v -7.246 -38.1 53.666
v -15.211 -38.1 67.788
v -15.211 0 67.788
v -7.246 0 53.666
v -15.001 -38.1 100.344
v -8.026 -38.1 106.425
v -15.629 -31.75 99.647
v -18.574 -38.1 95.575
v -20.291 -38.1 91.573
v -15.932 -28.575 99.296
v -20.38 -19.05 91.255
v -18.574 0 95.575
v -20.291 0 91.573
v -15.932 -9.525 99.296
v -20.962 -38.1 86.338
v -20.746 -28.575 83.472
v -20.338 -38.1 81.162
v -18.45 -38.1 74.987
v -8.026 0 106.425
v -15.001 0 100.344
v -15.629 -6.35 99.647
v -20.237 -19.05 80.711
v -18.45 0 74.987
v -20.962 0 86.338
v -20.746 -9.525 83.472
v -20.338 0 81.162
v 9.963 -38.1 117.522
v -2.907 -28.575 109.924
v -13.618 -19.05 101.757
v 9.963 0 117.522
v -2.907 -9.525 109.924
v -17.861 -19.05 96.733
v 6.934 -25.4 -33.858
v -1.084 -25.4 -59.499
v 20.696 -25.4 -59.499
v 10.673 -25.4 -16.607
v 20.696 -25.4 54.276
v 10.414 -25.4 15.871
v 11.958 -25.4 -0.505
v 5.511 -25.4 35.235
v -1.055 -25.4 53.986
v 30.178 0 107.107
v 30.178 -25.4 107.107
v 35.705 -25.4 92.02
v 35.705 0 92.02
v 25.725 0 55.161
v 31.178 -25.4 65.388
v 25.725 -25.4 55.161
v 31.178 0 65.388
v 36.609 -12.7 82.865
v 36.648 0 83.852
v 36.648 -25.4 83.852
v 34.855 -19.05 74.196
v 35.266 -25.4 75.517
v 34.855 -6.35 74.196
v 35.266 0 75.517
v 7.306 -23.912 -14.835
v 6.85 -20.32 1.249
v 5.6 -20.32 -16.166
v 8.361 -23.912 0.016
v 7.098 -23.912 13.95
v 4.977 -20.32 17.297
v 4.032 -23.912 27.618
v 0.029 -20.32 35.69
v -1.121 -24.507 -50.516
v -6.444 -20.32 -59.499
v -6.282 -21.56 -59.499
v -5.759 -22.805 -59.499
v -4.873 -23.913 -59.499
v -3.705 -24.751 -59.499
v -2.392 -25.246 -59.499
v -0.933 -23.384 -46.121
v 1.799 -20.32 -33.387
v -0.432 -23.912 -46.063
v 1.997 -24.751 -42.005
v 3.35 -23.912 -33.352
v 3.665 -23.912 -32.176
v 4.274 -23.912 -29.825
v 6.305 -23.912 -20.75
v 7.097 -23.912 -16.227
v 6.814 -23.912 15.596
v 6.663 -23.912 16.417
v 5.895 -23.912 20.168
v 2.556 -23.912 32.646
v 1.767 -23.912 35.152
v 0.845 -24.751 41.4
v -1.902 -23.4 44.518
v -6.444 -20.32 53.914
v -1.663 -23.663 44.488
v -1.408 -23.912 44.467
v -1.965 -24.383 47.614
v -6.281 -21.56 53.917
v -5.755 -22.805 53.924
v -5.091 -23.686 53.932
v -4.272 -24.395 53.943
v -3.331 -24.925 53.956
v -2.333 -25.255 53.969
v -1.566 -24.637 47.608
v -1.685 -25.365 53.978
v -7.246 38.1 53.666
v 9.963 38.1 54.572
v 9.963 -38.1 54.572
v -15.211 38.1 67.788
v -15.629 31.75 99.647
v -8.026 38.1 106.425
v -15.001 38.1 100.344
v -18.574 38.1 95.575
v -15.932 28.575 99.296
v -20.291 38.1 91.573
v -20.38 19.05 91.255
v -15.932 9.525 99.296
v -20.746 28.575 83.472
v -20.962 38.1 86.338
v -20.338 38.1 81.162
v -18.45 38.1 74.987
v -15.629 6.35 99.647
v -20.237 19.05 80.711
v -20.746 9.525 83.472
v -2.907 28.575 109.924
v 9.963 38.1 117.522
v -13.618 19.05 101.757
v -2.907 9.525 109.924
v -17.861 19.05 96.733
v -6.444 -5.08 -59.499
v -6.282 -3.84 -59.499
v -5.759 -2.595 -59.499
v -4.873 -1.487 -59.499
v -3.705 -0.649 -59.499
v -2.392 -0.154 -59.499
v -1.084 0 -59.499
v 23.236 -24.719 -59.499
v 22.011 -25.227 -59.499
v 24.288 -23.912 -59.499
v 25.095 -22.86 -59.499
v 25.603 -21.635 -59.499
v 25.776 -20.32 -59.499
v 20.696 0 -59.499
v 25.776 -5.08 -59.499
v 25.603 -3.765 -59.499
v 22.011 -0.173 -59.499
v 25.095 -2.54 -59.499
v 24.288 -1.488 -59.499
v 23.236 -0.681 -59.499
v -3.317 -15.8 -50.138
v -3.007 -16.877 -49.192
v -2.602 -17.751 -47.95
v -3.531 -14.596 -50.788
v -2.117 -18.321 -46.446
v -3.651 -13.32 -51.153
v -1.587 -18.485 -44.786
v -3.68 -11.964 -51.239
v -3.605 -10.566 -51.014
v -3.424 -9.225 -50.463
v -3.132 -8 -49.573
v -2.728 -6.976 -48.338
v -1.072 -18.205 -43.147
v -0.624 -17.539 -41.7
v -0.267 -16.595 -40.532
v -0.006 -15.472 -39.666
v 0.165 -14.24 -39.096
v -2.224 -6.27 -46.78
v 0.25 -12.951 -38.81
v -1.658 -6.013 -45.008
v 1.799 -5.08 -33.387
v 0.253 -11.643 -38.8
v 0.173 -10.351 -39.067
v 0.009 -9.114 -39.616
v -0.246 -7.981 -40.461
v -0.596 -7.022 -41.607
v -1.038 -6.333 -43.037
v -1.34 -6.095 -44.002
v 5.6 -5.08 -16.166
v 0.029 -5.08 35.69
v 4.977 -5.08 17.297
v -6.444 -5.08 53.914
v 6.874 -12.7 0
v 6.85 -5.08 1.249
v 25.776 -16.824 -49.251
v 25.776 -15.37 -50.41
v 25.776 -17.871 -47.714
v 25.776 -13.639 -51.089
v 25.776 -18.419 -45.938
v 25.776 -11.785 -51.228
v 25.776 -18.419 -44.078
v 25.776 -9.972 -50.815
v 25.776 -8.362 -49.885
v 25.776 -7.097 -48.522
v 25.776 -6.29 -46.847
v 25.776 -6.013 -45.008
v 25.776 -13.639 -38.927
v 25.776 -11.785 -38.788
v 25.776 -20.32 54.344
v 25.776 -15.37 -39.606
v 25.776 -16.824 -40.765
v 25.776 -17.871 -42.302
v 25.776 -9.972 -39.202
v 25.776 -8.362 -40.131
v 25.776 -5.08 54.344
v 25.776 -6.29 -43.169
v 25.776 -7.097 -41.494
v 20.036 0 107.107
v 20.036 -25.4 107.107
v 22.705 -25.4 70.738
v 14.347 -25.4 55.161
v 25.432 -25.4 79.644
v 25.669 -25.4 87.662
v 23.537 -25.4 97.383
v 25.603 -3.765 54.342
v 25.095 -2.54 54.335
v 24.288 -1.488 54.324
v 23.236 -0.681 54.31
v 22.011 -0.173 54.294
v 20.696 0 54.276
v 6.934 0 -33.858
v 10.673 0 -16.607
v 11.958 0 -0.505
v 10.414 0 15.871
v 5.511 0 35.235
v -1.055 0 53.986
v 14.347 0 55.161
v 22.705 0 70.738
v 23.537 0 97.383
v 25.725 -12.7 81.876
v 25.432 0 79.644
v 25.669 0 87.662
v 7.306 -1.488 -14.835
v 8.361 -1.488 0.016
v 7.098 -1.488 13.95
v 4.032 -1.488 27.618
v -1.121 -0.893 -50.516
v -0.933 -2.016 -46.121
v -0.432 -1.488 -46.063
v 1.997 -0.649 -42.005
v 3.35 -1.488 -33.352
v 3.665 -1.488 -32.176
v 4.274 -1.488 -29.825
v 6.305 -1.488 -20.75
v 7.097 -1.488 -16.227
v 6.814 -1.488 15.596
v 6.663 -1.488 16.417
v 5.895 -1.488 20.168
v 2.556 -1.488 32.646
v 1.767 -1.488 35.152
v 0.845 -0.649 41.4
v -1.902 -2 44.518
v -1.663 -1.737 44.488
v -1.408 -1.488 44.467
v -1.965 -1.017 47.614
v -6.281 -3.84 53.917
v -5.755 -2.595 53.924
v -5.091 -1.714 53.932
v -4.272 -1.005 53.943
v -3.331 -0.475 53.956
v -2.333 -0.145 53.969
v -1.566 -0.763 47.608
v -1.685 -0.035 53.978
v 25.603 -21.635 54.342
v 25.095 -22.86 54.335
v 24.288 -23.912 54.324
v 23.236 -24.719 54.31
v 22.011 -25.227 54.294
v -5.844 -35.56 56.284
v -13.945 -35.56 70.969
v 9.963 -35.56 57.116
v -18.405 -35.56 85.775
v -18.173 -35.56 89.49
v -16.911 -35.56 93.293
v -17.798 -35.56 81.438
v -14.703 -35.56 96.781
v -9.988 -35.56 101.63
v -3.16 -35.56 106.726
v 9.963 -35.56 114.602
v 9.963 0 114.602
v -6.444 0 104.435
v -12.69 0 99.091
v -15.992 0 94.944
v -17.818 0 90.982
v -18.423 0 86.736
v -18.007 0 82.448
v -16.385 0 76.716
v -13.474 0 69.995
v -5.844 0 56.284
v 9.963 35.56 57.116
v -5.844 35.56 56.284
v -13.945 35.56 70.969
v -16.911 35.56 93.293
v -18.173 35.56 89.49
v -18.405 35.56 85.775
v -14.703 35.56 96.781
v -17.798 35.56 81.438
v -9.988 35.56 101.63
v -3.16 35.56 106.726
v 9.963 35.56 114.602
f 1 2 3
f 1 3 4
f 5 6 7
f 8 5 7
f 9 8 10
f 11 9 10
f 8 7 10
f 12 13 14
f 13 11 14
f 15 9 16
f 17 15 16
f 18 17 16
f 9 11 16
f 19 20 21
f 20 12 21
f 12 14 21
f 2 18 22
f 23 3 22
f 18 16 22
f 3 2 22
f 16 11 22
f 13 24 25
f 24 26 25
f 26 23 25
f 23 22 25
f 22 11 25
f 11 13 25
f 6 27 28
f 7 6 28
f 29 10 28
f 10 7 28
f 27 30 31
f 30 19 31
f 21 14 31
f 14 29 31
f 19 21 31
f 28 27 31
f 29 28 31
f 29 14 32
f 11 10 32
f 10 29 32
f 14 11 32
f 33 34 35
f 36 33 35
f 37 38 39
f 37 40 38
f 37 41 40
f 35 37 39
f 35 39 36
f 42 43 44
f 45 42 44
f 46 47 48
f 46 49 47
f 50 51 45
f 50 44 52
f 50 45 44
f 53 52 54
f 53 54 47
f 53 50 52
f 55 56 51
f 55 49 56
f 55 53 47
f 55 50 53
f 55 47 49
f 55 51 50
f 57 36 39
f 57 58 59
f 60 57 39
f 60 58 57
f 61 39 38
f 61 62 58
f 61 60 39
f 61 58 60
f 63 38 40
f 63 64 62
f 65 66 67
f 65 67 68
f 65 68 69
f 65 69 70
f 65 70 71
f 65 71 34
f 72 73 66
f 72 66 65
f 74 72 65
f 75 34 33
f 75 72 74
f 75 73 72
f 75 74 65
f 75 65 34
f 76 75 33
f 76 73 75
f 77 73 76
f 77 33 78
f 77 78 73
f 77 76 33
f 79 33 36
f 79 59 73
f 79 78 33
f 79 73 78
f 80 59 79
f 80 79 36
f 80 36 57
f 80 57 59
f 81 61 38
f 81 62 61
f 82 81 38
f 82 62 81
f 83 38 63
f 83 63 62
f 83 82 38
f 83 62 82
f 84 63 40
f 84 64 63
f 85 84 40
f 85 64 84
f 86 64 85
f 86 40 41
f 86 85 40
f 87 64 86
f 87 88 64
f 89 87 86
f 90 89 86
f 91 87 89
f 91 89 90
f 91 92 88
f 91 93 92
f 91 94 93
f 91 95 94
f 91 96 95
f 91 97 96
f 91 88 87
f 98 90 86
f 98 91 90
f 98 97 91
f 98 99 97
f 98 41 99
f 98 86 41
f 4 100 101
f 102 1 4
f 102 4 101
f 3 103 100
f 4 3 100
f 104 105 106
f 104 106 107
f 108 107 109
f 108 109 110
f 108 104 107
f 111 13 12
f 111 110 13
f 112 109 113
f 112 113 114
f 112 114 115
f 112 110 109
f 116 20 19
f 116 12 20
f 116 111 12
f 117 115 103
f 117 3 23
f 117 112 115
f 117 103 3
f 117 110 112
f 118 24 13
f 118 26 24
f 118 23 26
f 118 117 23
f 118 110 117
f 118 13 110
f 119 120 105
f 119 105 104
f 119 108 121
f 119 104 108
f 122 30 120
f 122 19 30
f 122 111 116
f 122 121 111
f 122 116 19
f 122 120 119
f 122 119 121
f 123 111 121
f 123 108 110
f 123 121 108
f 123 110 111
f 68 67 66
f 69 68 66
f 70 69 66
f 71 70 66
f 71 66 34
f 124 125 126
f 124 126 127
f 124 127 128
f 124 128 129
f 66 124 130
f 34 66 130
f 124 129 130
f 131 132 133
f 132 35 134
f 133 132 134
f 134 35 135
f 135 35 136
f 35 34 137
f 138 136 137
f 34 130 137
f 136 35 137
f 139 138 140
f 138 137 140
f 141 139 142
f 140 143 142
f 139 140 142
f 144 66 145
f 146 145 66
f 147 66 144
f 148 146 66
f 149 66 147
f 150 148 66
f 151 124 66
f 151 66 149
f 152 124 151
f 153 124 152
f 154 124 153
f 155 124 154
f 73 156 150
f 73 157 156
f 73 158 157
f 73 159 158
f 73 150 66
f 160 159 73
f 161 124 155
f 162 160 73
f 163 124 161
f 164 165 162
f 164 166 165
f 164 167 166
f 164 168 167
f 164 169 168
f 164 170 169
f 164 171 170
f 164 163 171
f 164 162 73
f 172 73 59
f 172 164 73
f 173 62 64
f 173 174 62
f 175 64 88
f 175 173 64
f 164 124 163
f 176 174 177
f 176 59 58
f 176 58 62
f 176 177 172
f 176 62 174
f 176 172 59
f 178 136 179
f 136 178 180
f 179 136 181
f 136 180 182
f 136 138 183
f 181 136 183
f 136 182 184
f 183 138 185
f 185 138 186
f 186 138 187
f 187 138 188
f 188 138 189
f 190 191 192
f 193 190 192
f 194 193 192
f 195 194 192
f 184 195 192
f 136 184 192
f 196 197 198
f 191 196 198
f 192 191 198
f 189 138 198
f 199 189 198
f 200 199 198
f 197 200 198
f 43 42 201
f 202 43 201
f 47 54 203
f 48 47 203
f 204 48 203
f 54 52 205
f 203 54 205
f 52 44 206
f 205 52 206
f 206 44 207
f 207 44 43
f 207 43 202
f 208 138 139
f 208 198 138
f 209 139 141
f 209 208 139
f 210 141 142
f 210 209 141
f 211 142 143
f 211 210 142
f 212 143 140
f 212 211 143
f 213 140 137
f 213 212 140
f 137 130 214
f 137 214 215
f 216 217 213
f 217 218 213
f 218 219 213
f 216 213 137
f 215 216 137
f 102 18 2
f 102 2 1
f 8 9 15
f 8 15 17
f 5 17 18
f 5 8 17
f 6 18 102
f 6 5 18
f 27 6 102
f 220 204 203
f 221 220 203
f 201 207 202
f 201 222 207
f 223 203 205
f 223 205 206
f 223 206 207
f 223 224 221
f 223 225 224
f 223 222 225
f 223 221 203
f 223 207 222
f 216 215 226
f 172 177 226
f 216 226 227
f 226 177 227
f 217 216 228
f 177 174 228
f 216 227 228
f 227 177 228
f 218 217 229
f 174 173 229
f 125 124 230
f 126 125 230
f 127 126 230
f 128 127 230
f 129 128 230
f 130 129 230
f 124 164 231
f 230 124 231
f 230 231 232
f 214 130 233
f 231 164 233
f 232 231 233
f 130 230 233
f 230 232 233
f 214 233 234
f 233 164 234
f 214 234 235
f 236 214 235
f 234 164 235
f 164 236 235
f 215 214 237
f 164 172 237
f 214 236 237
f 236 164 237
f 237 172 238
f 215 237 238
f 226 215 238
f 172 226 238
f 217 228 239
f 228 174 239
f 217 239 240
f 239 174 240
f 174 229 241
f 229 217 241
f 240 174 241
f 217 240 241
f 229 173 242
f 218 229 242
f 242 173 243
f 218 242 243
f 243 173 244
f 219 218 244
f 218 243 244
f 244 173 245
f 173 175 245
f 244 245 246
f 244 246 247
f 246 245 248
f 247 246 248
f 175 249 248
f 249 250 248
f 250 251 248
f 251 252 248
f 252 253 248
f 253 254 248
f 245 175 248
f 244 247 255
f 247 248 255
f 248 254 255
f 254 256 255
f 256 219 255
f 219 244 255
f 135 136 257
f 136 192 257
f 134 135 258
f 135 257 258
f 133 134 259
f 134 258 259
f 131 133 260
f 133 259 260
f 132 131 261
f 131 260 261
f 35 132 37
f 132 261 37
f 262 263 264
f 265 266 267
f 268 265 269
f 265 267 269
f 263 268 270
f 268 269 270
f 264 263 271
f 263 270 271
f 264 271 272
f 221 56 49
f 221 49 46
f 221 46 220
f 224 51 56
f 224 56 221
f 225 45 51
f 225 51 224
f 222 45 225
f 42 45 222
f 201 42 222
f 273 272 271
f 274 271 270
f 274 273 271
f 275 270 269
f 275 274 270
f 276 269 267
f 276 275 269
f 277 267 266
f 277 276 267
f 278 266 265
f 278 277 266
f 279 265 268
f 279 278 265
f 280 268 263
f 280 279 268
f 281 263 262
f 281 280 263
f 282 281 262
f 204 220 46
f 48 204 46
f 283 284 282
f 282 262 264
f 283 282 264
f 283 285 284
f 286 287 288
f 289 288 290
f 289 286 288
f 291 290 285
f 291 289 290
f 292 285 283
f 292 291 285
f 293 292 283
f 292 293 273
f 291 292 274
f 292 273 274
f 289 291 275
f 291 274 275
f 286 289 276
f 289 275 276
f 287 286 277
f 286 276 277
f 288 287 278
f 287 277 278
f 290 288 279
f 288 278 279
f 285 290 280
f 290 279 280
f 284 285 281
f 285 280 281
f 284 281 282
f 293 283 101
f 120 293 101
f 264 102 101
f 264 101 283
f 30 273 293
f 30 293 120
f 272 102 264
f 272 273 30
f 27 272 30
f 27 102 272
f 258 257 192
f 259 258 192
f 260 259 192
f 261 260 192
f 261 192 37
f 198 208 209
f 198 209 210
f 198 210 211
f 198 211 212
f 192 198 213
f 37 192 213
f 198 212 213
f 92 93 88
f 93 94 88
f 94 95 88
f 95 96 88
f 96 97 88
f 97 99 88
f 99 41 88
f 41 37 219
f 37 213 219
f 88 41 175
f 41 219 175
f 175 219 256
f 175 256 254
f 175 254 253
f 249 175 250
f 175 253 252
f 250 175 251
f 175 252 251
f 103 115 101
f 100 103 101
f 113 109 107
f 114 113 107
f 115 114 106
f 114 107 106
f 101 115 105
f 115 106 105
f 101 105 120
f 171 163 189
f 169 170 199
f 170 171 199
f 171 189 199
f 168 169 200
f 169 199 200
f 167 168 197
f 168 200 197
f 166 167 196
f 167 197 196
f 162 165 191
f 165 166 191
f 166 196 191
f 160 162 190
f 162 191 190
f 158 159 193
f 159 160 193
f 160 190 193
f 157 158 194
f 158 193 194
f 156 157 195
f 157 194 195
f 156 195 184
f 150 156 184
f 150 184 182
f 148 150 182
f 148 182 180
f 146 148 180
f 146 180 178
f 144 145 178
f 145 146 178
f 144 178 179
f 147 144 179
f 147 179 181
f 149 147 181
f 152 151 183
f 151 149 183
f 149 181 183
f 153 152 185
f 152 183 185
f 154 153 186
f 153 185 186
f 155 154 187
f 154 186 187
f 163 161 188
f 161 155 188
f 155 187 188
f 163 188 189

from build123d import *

# Parameters (mm, degrees)
F1_DEPTH = 25.4
F3_DEPTH = 38.1
F5_DEPTH = 25.4
F6_T     = -2.54
F7_R     = 6.2376942626
F8_DEPTH = 76.962
F9_R     = 5.08


with BuildPart() as f1:
    # F0 (on Front) → F1 (new body)
    with BuildSketch(Plane.XZ):
        with BuildLine():
            Line((25.7757790387, -59.4990924001), (25.7757790387, 54.3439313769))
            Line((25.7757790387, 54.3439313769), (-6.443947088, 53.9143383503))
            add(Edge.make_bspline(
                [(-6.443947088, -59.4990924001), (0.3209026486, -39.4095928561), (13.5419675651, -0.1471424018), (0.1135326519, 36.1764929279), (-6.443947088, 53.9143383503)],
                knots=[0, 0, 0, 0, 0.5116720763, 1, 1, 1, 1], degree=3))
            Line((-6.443947088, -59.4990924001), (25.7757790387, -59.4990924001))
        make_face()
    extrude(amount=F1_DEPTH)

    # F7 (on face) → F8 (cut)
    with BuildSketch(Plane.YZ.offset(25.7757790387)):
        with Locations((-12.2509924695, -45.008007437)):
            Circle(F7_R)
    extrude(amount=-F8_DEPTH, mode=Mode.SUBTRACT)

    # F9
    f9_edges = [f1.edges().sort_by_distance(p)[0] for p in [
        (25.775779, -25.4, -2.577581),
        (25.775779, 0, -2.577581),
        (6.858147, -25.4, -2.720222),
        (6.858147, 0, -2.720222),
    ]]
    fillet(f9_edges, radius=F9_R)


with BuildPart() as f3:
    # F2 (on Front) → F3 (new body, symmetric)
    with BuildSketch(Plane.XZ):
        with BuildLine():
            Line((-7.2460789233, 53.666241467), (9.9633475766, 54.5720010996))
            Line((9.9633475766, 54.5720010996), (9.9633475766, 117.5222694874))
            add(Edge.make_bspline(
                [(9.9633475766, 117.5222694874), (-3.7854881295, 109.7243710835), (-31.2290050407, 94.1592889709), (-15.2298638868, 67.146155561), (-7.2460789233, 53.666241467)],
                knots=[0, 0, 0, 0, 0.5009866538, 1, 1, 1, 1], degree=3))
        make_face()
    extrude(amount=F3_DEPTH, both=True)

    # F6
    f6_openings = [f3.faces().sort_by_distance(p)[0] for p in [
        (9.963348, 0, 86.047135),
    ]]
    offset(amount=F6_T, openings=f6_openings, kind=Kind.INTERSECTION)


with BuildPart() as f5:
    # F4 (on Front) → F5 (new body)
    with BuildSketch(Plane.XZ):
        with BuildLine():
            add(Edge.make_bspline(
                [(14.3468296155, 55.1610998809), (19.6321787876, 64.0644294014), (29.9057546636, 81.3705767157), (23.2619311282, 98.694895747), (20.0360924937, 107.1065366268)],
                knots=[0, 0, 0, 0, 0.5144605185, 1, 1, 1, 1], degree=3))
            Line((14.3468296155, 55.1610998809), (25.7253553718, 55.1610998809))
            add(Edge.make_bspline(
                [(30.1778223366, 107.1065366268), (33.6315224553, 99.120987607), (40.8477390376, 82.4358530342), (30.9079403999, 64.5084177682), (25.7253553718, 55.1610998809)],
                knots=[0, 0, 0, 0, 0.4786026139, 1, 1, 1, 1], degree=3))
            Line((30.1778223366, 107.1065366268), (20.0360924937, 107.1065366268))
        make_face()
    extrude(amount=F5_DEPTH)


solid = Compound([f1.part, f3.part, f5.part])
